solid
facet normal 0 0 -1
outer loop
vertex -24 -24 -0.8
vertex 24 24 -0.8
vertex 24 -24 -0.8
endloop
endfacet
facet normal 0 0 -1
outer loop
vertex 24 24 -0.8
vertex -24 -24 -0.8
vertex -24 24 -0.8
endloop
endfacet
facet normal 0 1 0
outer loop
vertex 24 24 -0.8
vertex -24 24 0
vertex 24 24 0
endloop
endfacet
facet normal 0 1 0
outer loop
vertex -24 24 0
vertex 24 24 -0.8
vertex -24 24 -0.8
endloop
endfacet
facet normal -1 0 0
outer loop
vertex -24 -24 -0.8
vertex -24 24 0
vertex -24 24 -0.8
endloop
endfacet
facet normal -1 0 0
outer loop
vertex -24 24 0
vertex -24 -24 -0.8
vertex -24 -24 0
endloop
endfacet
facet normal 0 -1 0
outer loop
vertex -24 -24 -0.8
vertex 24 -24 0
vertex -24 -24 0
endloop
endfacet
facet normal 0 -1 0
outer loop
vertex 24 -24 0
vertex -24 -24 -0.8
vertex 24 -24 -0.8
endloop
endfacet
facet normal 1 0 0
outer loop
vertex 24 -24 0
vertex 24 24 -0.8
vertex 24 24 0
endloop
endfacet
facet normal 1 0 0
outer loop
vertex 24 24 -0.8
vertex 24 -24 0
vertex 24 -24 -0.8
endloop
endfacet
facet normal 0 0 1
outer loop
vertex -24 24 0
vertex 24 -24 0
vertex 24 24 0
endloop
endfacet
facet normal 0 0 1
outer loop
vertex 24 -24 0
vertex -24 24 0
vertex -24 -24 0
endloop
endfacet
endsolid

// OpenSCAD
// file: ../p/box5.scad
use <../lib.scad>
function ldraw_lib__box5() = [
// 0 Box with 5 Faces and All Edges
// 0 Name: box5.dat
// 0 Author: James Jessiman
// 0 !LDRAW_ORG Primitive UPDATE 2012-01
// 0 !LICENSE Licensed under CC BY 4.0 : see CAreadme.txt
// 
// 0 BFC CERTIFY CCW
  [0,"BFC","CERTIFY"],
  [0,"BFC","CCW"],
// 
// 0 !HISTORY 2002-04-03 [sbliss] Modified for BFC compliance
// 0 !HISTORY 2002-04-25 [PTadmin] Official Update 2002-02
// 0 !HISTORY 2007-06-24 [PTadmin] Header formatted for Contributor Agreement
// 0 !HISTORY 2008-07-01 [PTadmin] Official Update 2008-01
// 0 !HISTORY 2012-02-16 [Philo] Changed to CCW
// 0 !HISTORY 2012-03-30 [PTadmin] Official Update 2012-01
// 
// 
// 2 24 1 1 1 -1 1 1
  [2,24,1,1,1,-1,1,1],
// 2 24 -1 1 1 -1 1 -1
  [2,24,-1,1,1,-1,1,-1],
// 2 24 -1 1 -1 1 1 -1
  [2,24,-1,1,-1,1,1,-1],
// 2 24 1 1 -1 1 1 1
  [2,24,1,1,-1,1,1,1],
// 2 24 1 0 1 -1 0 1
  [2,24,1,0,1,-1,0,1],
// 2 24 -1 0 1 -1 0 -1
  [2,24,-1,0,1,-1,0,-1],
// 2 24 -1 0 -1 1 0 -1
  [2,24,-1,0,-1,1,0,-1],
// 2 24 1 0 -1 1 0 1
  [2,24,1,0,-1,1,0,1],
// 2 24 1 0 1 1 1 1
  [2,24,1,0,1,1,1,1],
// 2 24 -1 0 1 -1 1 1
  [2,24,-1,0,1,-1,1,1],
// 2 24 1 0 -1 1 1 -1
  [2,24,1,0,-1,1,1,-1],
// 2 24 -1 0 -1 -1 1 -1
  [2,24,-1,0,-1,-1,1,-1],
// 4 16 -1 1 1 1 1 1 1 1 -1 -1 1 -1
  [4,16,-1,1,1,1,1,1,1,1,-1,-1,1,-1],
// 4 16 -1 1 1 -1 0 1 1 0 1 1 1 1
  [4,16,-1,1,1,-1,0,1,1,0,1,1,1,1],
// 4 16 -1 1 -1 -1 0 -1 -1 0 1 -1 1 1
  [4,16,-1,1,-1,-1,0,-1,-1,0,1,-1,1,1],
// 4 16 1 1 -1 1 0 -1 -1 0 -1 -1 1 -1
  [4,16,1,1,-1,1,0,-1,-1,0,-1,-1,1,-1],
// 4 16 1 1 1 1 0 1 1 0 -1 1 1 -1
  [4,16,1,1,1,1,0,1,1,0,-1,1,1,-1],
];
module ldraw_lib__box5(step=0, col=false, unit=2/5, alt=false, line=0.2, solid=!$preview)
    makepoly(ldraw_lib__box5(), step=step, col=col, unit=unit, alt=alt, line=line, solid=solid);
ldraw_lib__box5(line=0.2);
// main file
use <../lib.scad>
use <../p/box5.scad>
function ldraw_lib__191764() = [
// 0 Cardboard  6 x  6 Thick with Sharp Corners with 2 Dogs Photo
// 0 Name: 191764.dat
// 0 Author: Steffen [Steffen]
// 0 !LDRAW_ORG Part UPDATE 2020-02
// 0 !LICENSE Licensed under CC BY 4.0 : see CAreadme.txt
// 
// 0 BFC CERTIFY CCW
  [0,"BFC","CERTIFY"],
  [0,"BFC","CCW"],
// 
// 0 !CATEGORY Sheet Cardboard
// 0 !KEYWORDS Scala, set 4336
// 
// 0 !HISTORY 2020-09-05 [PTadmin] Official Update 2020-02
// 
// 
// 1 16 0 0 0 60 0 0 0 2 0 0 0 60 box5.dat
  [1,16,0,0,0,60,0,0,0,2,0,0,0,60, ldraw_lib__box5()],
// 
// 0 !TEXMAP START PLANAR -60 0 60 60 0 60 -60 0 -60 191764.png
// 0 !: 4 16 -60 0 -60 60 0 -60 60 0 60 -60 0 60
// 0 !TEXMAP FALLBACK
// 4 16 -60 0 -60 60 0 -60 60 0 60 -60 0 60
  [4,16,-60,0,-60,60,0,-60,60,0,60,-60,0,60],
// 0 !TEXMAP END
];
module ldraw_lib__191764(step=0, col=false, unit=2/5, alt=false, line=0.2, solid=!$preview)
    makepoly(ldraw_lib__191764(), step=step, col=col, unit=unit, alt=alt, line=line, solid=solid);
ldraw_lib__191764(line=0.2);
